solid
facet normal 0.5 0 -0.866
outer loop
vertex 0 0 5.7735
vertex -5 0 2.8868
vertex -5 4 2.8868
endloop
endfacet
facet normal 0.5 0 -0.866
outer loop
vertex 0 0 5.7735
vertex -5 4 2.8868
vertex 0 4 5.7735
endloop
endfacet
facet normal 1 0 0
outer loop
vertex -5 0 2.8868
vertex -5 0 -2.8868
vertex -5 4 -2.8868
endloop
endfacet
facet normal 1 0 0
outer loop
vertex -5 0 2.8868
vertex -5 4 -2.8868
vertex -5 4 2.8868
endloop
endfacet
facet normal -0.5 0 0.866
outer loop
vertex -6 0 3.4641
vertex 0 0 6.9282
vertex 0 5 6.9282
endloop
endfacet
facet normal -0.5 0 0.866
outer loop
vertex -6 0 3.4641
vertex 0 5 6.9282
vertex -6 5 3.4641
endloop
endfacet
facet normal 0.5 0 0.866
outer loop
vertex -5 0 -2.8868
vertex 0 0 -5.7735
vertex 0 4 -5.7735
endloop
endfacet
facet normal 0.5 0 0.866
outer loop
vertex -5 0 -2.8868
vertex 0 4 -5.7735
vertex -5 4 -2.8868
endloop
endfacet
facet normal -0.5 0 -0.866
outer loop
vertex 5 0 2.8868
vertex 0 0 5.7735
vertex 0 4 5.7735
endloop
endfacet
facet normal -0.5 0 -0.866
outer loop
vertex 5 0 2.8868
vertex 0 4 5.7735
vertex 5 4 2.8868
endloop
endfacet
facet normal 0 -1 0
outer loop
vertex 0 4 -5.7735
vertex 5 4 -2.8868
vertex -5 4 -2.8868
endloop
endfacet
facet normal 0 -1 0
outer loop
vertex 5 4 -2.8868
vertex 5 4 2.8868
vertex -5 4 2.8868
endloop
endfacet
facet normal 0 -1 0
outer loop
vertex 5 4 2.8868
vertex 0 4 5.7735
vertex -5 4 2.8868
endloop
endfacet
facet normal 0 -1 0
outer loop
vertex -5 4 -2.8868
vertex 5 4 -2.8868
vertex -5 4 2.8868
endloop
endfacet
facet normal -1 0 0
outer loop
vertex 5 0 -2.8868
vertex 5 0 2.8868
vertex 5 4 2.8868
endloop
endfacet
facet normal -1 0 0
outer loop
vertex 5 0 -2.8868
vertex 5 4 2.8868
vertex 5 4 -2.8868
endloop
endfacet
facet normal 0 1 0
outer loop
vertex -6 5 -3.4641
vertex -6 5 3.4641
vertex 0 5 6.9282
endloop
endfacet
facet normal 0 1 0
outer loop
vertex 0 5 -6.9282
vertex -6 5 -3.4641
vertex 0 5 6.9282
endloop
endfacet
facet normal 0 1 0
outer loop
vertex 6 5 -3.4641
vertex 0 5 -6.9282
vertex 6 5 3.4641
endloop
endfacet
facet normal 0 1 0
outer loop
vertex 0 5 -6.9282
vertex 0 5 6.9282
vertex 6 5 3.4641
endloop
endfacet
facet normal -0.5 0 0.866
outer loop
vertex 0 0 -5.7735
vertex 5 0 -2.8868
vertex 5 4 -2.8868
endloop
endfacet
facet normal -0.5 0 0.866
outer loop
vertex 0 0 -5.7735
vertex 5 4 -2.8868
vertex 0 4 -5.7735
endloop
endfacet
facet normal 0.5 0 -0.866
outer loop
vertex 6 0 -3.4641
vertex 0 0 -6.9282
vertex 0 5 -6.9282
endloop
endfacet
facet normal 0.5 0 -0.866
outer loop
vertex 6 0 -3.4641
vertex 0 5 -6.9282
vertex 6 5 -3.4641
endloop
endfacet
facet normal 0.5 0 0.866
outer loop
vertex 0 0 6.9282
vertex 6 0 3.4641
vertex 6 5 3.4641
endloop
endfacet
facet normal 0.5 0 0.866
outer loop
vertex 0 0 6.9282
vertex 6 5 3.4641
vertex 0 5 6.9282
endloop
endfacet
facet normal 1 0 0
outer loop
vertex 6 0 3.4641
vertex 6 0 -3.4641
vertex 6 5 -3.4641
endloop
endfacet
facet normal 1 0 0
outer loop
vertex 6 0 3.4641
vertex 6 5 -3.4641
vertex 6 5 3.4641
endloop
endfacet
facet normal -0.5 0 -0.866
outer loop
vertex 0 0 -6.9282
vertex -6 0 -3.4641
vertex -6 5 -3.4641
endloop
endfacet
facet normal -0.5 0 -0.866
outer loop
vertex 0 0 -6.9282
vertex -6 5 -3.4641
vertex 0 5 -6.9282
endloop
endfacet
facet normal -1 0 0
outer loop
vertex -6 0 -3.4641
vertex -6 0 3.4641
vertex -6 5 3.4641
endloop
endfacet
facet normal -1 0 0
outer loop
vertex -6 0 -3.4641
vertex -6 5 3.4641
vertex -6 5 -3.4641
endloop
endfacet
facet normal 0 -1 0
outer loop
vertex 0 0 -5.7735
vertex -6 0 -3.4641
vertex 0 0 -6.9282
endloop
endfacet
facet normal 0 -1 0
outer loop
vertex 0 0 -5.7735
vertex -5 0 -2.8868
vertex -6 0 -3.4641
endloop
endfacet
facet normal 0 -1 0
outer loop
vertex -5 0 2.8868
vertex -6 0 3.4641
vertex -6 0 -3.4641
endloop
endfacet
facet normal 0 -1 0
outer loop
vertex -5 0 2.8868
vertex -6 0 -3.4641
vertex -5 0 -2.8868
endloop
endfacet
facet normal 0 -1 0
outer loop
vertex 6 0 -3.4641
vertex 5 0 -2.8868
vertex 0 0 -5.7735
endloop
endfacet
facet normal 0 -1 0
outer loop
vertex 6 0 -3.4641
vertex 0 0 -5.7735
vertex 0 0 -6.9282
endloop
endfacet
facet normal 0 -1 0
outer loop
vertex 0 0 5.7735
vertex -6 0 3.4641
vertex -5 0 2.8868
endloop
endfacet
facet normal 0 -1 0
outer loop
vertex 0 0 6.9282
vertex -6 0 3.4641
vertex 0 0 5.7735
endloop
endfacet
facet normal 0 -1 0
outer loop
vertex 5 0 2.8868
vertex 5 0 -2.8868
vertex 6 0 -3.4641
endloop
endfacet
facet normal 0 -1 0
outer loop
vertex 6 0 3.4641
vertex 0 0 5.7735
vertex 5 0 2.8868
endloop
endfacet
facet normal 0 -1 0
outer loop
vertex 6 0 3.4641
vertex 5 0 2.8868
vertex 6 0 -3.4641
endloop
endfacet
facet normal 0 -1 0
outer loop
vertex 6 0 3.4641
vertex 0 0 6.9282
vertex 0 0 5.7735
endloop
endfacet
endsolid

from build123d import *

# Parameters (mm, degrees)
F1_DEPTH = 5
F3_DEPTH = 1


with BuildPart() as f1:
    # F0 (on Front) → F1 (new body)
    with BuildSketch(Plane.XZ):
        Polygon((0, 6.928203), (-6, 3.464102), (-6, -3.464102), (0, -6.928203), (6, -3.464102), (6, 3.464102), align=None)
        Polygon((0, -5.773503), (-5, -2.886751), (-5, 2.886751), (0, 5.773503), (5, 2.886751), (5, -2.886751), align=None, mode=Mode.SUBTRACT)
    extrude(amount=-F1_DEPTH)

    # F2 (on face) → F3 (join)
    with BuildSketch(Plane(origin=(0, 5, 0), x_dir=(-1, 0, 0), z_dir=(0, 1, 0))):
        Polygon((6, 3.464102), (0, 6.928203), (-6, 3.464102), (-6, -3.464102), (0, -6.928203), (6, -3.464102), align=None)
    extrude(amount=-F3_DEPTH)


solid = f1.part
